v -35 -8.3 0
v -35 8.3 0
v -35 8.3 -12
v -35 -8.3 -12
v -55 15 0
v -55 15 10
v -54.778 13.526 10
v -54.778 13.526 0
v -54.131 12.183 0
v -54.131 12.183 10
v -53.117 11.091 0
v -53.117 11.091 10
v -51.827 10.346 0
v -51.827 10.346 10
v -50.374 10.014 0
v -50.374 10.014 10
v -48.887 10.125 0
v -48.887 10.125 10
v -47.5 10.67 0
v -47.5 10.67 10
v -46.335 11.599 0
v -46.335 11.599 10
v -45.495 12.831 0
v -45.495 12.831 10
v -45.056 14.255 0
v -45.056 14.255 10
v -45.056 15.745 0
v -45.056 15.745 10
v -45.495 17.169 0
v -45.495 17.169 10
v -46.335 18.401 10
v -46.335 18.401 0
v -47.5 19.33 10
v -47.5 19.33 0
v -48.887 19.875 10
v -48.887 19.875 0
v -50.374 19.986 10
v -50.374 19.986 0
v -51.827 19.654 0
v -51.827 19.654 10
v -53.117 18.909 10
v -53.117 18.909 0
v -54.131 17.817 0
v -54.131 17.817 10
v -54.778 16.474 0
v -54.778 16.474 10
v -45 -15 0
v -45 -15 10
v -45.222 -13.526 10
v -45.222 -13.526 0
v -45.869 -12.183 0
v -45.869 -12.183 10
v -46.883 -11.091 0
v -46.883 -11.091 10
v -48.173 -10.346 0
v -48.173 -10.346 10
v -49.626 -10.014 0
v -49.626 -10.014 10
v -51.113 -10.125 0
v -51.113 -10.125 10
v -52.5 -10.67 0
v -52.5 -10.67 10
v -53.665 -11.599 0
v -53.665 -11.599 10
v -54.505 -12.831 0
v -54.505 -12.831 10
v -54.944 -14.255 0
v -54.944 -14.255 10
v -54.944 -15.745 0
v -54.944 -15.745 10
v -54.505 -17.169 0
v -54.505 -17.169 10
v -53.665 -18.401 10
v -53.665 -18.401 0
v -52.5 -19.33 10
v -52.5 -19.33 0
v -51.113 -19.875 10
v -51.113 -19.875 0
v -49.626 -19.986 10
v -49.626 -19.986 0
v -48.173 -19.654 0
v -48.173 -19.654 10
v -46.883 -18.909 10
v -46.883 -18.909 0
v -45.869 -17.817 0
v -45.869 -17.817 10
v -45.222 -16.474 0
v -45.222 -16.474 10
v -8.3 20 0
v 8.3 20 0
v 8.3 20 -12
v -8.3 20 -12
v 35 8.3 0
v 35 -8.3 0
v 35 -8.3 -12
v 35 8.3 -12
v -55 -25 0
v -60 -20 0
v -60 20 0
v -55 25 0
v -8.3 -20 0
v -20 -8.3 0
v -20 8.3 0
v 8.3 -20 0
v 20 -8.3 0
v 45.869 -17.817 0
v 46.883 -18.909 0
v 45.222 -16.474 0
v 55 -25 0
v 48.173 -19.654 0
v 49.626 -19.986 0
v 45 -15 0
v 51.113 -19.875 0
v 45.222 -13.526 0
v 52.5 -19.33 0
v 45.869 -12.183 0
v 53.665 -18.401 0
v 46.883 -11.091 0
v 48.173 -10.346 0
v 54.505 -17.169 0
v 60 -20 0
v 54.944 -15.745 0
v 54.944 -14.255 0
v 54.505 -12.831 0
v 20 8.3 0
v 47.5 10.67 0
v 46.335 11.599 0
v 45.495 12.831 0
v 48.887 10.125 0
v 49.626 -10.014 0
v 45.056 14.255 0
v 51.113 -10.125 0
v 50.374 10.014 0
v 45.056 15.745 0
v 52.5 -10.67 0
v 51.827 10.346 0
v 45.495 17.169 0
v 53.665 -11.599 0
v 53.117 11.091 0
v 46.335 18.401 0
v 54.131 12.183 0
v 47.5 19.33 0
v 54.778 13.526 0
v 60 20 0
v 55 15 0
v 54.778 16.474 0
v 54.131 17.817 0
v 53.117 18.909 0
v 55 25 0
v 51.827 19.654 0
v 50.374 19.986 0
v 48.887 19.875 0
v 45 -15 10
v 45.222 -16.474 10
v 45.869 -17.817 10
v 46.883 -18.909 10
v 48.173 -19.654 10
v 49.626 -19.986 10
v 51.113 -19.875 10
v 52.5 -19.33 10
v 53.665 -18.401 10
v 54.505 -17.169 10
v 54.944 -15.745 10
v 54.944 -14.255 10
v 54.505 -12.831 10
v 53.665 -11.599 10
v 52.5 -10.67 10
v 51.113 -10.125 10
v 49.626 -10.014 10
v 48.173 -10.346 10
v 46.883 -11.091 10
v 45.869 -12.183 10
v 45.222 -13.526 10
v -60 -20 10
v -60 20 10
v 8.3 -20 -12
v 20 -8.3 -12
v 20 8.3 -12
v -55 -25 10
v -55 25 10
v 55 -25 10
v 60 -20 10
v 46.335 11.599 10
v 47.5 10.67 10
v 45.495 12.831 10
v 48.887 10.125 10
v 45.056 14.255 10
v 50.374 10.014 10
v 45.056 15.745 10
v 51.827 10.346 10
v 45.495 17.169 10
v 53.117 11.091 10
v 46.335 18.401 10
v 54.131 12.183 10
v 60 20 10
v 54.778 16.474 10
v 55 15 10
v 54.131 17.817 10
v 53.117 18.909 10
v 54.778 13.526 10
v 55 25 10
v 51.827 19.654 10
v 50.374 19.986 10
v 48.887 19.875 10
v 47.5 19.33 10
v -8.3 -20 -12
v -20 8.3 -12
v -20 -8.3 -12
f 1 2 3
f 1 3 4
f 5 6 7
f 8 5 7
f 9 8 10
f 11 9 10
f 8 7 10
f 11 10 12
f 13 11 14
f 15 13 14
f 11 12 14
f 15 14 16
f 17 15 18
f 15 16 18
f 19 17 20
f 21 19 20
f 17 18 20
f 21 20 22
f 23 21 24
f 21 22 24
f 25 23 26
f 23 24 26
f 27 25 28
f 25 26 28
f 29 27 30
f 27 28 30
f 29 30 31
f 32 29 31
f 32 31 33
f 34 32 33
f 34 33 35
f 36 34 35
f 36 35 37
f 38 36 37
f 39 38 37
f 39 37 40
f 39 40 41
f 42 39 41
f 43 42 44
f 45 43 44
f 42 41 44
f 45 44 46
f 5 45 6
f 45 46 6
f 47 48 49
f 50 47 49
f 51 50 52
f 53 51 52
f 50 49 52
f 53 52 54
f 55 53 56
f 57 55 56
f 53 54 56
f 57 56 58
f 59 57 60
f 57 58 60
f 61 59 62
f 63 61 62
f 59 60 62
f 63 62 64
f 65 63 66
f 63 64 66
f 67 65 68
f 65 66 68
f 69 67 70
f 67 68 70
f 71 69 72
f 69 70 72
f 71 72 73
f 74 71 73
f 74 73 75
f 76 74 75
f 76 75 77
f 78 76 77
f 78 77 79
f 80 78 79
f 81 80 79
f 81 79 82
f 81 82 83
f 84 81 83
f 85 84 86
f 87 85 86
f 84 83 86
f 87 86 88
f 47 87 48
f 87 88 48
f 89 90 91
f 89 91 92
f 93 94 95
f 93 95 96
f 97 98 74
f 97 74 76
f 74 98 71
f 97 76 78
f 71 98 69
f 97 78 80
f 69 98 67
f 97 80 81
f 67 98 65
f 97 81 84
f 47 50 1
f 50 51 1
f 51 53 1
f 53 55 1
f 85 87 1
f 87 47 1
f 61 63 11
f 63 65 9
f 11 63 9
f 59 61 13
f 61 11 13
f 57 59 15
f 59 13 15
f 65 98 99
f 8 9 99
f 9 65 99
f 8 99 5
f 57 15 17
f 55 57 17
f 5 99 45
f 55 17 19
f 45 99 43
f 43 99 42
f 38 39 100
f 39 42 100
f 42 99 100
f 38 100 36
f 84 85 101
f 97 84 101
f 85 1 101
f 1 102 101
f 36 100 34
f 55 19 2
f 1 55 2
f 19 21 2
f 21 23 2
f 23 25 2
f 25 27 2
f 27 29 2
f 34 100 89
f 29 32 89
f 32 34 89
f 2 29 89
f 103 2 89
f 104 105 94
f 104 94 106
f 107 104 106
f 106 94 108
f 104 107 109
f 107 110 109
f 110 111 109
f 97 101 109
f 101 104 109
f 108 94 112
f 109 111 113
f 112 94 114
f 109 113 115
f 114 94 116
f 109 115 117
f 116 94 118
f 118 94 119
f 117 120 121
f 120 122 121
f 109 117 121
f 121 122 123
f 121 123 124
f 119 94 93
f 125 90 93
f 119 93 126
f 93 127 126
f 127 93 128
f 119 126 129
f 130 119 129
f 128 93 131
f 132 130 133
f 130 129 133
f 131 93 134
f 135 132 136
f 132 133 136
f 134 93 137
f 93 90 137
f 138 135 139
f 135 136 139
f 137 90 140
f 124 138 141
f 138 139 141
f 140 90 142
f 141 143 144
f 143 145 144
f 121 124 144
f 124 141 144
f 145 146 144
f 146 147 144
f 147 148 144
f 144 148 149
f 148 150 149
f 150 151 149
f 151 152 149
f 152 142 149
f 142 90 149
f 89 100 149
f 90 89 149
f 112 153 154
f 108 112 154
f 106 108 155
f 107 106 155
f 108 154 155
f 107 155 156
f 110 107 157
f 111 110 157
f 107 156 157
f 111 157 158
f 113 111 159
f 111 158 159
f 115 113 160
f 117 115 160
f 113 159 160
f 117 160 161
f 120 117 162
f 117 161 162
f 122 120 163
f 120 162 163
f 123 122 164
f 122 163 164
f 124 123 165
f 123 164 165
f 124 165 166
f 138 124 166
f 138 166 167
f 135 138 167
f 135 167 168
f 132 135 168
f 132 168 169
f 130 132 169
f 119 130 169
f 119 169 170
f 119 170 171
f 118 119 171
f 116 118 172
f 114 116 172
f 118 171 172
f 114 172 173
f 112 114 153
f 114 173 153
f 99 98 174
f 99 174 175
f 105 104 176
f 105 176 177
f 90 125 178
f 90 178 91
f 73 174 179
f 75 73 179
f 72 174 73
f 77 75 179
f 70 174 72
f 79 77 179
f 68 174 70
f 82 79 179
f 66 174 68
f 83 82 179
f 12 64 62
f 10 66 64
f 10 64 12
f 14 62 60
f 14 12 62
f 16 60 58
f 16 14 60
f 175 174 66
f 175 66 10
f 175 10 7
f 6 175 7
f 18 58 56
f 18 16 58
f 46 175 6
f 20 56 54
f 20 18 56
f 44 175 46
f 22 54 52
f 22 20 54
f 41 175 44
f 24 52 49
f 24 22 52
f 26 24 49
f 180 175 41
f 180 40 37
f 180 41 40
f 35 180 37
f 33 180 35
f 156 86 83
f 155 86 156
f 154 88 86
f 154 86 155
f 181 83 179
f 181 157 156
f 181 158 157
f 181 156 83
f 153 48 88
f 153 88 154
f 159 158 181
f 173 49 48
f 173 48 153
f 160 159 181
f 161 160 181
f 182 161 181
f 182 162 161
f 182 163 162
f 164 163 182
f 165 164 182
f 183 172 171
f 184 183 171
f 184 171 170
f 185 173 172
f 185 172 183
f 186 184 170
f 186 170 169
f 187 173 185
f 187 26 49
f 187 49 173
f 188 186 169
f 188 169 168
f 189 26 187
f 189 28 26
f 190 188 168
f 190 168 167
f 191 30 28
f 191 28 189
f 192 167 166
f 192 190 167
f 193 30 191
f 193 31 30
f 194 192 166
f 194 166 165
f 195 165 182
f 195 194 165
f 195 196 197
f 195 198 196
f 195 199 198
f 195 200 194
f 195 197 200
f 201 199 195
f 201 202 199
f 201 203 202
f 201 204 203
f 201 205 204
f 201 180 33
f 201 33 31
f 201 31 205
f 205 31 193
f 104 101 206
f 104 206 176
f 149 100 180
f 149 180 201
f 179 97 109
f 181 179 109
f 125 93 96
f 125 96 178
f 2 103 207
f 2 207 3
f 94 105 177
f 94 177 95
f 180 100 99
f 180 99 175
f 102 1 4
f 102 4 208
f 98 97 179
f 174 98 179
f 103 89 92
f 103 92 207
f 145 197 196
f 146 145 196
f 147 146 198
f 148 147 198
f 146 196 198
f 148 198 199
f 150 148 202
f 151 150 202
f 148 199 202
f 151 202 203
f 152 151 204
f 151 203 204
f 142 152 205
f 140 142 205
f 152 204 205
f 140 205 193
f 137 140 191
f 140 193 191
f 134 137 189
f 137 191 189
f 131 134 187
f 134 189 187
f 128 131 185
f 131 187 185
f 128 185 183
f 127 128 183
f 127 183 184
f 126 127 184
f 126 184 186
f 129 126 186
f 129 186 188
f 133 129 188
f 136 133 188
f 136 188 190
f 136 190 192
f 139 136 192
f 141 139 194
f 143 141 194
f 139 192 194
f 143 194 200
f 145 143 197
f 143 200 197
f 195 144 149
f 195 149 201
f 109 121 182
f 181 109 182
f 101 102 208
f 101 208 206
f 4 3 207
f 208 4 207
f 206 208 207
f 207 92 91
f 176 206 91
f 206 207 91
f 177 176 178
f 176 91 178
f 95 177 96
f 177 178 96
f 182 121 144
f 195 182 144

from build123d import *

# Parameters (mm, degrees)
SKETCH_156_W          = 120
SKETCH_156_H          = 50
EXTRUDE_416_DEPTH     = 10
CUT_EXTRUDE_START     = 10
SKETCH_1_5_R          = 5
CUT_EXTRUDE_465_DEPTH = 10
CHAMFER_532_SIZE      = 5
EXTRUDE_START         = -10
EXTRUDE_2_DEPTH       = 22


with BuildPart() as part:
    # Sketch 156 → Extrude 416 (new body)
    with BuildSketch(Plane.XY):
        Rectangle(SKETCH_156_W, SKETCH_156_H)
    extrude(amount=EXTRUDE_416_DEPTH)

    # Эскиз1<5> → Cut-Extrude 465 (cut)
    with BuildSketch(Plane.XY.offset(CUT_EXTRUDE_START)):
        with Locations((50, 15)):
            Circle(SKETCH_1_5_R)
        with Locations(Location((-50, 15, 0), (0, 0, 180))):
            Circle(SKETCH_1_5_R)
        with Locations((-50, -15)):
            Circle(SKETCH_1_5_R)
        with Locations(Location((50, -15, 0), (0, 0, 180))):
            Circle(SKETCH_1_5_R)
    extrude(amount=-CUT_EXTRUDE_465_DEPTH, mode=Mode.SUBTRACT)

    # Chamfer 532
    chamfer_532_edges = [part.edges().sort_by_distance(p)[0] for p in [
        (-60, 25, 5),
        (60, 25, 5),
        (60, -25, 5),
        (-60, -25, 5),
    ]]
    chamfer(chamfer_532_edges, length=CHAMFER_532_SIZE)

    # Эскиз2 → Бобышка-Вытянуть2 (add)
    with BuildSketch(Plane(origin=(0, 0, 0), x_dir=(-1, 0, 0), z_dir=(0, 0, -1)).offset(EXTRUDE_START)):
        Polygon((-8.3, 20), (8.3, 20), (20, 8.3), (35, 8.3), (35, -8.3), (20, -8.3), (8.3, -20), (-8.3, -20), (-20, -8.3), (-35, -8.3), (-35, 8.3), (-20, 8.3), align=None)
    extrude(amount=EXTRUDE_2_DEPTH)


solid = part.part
